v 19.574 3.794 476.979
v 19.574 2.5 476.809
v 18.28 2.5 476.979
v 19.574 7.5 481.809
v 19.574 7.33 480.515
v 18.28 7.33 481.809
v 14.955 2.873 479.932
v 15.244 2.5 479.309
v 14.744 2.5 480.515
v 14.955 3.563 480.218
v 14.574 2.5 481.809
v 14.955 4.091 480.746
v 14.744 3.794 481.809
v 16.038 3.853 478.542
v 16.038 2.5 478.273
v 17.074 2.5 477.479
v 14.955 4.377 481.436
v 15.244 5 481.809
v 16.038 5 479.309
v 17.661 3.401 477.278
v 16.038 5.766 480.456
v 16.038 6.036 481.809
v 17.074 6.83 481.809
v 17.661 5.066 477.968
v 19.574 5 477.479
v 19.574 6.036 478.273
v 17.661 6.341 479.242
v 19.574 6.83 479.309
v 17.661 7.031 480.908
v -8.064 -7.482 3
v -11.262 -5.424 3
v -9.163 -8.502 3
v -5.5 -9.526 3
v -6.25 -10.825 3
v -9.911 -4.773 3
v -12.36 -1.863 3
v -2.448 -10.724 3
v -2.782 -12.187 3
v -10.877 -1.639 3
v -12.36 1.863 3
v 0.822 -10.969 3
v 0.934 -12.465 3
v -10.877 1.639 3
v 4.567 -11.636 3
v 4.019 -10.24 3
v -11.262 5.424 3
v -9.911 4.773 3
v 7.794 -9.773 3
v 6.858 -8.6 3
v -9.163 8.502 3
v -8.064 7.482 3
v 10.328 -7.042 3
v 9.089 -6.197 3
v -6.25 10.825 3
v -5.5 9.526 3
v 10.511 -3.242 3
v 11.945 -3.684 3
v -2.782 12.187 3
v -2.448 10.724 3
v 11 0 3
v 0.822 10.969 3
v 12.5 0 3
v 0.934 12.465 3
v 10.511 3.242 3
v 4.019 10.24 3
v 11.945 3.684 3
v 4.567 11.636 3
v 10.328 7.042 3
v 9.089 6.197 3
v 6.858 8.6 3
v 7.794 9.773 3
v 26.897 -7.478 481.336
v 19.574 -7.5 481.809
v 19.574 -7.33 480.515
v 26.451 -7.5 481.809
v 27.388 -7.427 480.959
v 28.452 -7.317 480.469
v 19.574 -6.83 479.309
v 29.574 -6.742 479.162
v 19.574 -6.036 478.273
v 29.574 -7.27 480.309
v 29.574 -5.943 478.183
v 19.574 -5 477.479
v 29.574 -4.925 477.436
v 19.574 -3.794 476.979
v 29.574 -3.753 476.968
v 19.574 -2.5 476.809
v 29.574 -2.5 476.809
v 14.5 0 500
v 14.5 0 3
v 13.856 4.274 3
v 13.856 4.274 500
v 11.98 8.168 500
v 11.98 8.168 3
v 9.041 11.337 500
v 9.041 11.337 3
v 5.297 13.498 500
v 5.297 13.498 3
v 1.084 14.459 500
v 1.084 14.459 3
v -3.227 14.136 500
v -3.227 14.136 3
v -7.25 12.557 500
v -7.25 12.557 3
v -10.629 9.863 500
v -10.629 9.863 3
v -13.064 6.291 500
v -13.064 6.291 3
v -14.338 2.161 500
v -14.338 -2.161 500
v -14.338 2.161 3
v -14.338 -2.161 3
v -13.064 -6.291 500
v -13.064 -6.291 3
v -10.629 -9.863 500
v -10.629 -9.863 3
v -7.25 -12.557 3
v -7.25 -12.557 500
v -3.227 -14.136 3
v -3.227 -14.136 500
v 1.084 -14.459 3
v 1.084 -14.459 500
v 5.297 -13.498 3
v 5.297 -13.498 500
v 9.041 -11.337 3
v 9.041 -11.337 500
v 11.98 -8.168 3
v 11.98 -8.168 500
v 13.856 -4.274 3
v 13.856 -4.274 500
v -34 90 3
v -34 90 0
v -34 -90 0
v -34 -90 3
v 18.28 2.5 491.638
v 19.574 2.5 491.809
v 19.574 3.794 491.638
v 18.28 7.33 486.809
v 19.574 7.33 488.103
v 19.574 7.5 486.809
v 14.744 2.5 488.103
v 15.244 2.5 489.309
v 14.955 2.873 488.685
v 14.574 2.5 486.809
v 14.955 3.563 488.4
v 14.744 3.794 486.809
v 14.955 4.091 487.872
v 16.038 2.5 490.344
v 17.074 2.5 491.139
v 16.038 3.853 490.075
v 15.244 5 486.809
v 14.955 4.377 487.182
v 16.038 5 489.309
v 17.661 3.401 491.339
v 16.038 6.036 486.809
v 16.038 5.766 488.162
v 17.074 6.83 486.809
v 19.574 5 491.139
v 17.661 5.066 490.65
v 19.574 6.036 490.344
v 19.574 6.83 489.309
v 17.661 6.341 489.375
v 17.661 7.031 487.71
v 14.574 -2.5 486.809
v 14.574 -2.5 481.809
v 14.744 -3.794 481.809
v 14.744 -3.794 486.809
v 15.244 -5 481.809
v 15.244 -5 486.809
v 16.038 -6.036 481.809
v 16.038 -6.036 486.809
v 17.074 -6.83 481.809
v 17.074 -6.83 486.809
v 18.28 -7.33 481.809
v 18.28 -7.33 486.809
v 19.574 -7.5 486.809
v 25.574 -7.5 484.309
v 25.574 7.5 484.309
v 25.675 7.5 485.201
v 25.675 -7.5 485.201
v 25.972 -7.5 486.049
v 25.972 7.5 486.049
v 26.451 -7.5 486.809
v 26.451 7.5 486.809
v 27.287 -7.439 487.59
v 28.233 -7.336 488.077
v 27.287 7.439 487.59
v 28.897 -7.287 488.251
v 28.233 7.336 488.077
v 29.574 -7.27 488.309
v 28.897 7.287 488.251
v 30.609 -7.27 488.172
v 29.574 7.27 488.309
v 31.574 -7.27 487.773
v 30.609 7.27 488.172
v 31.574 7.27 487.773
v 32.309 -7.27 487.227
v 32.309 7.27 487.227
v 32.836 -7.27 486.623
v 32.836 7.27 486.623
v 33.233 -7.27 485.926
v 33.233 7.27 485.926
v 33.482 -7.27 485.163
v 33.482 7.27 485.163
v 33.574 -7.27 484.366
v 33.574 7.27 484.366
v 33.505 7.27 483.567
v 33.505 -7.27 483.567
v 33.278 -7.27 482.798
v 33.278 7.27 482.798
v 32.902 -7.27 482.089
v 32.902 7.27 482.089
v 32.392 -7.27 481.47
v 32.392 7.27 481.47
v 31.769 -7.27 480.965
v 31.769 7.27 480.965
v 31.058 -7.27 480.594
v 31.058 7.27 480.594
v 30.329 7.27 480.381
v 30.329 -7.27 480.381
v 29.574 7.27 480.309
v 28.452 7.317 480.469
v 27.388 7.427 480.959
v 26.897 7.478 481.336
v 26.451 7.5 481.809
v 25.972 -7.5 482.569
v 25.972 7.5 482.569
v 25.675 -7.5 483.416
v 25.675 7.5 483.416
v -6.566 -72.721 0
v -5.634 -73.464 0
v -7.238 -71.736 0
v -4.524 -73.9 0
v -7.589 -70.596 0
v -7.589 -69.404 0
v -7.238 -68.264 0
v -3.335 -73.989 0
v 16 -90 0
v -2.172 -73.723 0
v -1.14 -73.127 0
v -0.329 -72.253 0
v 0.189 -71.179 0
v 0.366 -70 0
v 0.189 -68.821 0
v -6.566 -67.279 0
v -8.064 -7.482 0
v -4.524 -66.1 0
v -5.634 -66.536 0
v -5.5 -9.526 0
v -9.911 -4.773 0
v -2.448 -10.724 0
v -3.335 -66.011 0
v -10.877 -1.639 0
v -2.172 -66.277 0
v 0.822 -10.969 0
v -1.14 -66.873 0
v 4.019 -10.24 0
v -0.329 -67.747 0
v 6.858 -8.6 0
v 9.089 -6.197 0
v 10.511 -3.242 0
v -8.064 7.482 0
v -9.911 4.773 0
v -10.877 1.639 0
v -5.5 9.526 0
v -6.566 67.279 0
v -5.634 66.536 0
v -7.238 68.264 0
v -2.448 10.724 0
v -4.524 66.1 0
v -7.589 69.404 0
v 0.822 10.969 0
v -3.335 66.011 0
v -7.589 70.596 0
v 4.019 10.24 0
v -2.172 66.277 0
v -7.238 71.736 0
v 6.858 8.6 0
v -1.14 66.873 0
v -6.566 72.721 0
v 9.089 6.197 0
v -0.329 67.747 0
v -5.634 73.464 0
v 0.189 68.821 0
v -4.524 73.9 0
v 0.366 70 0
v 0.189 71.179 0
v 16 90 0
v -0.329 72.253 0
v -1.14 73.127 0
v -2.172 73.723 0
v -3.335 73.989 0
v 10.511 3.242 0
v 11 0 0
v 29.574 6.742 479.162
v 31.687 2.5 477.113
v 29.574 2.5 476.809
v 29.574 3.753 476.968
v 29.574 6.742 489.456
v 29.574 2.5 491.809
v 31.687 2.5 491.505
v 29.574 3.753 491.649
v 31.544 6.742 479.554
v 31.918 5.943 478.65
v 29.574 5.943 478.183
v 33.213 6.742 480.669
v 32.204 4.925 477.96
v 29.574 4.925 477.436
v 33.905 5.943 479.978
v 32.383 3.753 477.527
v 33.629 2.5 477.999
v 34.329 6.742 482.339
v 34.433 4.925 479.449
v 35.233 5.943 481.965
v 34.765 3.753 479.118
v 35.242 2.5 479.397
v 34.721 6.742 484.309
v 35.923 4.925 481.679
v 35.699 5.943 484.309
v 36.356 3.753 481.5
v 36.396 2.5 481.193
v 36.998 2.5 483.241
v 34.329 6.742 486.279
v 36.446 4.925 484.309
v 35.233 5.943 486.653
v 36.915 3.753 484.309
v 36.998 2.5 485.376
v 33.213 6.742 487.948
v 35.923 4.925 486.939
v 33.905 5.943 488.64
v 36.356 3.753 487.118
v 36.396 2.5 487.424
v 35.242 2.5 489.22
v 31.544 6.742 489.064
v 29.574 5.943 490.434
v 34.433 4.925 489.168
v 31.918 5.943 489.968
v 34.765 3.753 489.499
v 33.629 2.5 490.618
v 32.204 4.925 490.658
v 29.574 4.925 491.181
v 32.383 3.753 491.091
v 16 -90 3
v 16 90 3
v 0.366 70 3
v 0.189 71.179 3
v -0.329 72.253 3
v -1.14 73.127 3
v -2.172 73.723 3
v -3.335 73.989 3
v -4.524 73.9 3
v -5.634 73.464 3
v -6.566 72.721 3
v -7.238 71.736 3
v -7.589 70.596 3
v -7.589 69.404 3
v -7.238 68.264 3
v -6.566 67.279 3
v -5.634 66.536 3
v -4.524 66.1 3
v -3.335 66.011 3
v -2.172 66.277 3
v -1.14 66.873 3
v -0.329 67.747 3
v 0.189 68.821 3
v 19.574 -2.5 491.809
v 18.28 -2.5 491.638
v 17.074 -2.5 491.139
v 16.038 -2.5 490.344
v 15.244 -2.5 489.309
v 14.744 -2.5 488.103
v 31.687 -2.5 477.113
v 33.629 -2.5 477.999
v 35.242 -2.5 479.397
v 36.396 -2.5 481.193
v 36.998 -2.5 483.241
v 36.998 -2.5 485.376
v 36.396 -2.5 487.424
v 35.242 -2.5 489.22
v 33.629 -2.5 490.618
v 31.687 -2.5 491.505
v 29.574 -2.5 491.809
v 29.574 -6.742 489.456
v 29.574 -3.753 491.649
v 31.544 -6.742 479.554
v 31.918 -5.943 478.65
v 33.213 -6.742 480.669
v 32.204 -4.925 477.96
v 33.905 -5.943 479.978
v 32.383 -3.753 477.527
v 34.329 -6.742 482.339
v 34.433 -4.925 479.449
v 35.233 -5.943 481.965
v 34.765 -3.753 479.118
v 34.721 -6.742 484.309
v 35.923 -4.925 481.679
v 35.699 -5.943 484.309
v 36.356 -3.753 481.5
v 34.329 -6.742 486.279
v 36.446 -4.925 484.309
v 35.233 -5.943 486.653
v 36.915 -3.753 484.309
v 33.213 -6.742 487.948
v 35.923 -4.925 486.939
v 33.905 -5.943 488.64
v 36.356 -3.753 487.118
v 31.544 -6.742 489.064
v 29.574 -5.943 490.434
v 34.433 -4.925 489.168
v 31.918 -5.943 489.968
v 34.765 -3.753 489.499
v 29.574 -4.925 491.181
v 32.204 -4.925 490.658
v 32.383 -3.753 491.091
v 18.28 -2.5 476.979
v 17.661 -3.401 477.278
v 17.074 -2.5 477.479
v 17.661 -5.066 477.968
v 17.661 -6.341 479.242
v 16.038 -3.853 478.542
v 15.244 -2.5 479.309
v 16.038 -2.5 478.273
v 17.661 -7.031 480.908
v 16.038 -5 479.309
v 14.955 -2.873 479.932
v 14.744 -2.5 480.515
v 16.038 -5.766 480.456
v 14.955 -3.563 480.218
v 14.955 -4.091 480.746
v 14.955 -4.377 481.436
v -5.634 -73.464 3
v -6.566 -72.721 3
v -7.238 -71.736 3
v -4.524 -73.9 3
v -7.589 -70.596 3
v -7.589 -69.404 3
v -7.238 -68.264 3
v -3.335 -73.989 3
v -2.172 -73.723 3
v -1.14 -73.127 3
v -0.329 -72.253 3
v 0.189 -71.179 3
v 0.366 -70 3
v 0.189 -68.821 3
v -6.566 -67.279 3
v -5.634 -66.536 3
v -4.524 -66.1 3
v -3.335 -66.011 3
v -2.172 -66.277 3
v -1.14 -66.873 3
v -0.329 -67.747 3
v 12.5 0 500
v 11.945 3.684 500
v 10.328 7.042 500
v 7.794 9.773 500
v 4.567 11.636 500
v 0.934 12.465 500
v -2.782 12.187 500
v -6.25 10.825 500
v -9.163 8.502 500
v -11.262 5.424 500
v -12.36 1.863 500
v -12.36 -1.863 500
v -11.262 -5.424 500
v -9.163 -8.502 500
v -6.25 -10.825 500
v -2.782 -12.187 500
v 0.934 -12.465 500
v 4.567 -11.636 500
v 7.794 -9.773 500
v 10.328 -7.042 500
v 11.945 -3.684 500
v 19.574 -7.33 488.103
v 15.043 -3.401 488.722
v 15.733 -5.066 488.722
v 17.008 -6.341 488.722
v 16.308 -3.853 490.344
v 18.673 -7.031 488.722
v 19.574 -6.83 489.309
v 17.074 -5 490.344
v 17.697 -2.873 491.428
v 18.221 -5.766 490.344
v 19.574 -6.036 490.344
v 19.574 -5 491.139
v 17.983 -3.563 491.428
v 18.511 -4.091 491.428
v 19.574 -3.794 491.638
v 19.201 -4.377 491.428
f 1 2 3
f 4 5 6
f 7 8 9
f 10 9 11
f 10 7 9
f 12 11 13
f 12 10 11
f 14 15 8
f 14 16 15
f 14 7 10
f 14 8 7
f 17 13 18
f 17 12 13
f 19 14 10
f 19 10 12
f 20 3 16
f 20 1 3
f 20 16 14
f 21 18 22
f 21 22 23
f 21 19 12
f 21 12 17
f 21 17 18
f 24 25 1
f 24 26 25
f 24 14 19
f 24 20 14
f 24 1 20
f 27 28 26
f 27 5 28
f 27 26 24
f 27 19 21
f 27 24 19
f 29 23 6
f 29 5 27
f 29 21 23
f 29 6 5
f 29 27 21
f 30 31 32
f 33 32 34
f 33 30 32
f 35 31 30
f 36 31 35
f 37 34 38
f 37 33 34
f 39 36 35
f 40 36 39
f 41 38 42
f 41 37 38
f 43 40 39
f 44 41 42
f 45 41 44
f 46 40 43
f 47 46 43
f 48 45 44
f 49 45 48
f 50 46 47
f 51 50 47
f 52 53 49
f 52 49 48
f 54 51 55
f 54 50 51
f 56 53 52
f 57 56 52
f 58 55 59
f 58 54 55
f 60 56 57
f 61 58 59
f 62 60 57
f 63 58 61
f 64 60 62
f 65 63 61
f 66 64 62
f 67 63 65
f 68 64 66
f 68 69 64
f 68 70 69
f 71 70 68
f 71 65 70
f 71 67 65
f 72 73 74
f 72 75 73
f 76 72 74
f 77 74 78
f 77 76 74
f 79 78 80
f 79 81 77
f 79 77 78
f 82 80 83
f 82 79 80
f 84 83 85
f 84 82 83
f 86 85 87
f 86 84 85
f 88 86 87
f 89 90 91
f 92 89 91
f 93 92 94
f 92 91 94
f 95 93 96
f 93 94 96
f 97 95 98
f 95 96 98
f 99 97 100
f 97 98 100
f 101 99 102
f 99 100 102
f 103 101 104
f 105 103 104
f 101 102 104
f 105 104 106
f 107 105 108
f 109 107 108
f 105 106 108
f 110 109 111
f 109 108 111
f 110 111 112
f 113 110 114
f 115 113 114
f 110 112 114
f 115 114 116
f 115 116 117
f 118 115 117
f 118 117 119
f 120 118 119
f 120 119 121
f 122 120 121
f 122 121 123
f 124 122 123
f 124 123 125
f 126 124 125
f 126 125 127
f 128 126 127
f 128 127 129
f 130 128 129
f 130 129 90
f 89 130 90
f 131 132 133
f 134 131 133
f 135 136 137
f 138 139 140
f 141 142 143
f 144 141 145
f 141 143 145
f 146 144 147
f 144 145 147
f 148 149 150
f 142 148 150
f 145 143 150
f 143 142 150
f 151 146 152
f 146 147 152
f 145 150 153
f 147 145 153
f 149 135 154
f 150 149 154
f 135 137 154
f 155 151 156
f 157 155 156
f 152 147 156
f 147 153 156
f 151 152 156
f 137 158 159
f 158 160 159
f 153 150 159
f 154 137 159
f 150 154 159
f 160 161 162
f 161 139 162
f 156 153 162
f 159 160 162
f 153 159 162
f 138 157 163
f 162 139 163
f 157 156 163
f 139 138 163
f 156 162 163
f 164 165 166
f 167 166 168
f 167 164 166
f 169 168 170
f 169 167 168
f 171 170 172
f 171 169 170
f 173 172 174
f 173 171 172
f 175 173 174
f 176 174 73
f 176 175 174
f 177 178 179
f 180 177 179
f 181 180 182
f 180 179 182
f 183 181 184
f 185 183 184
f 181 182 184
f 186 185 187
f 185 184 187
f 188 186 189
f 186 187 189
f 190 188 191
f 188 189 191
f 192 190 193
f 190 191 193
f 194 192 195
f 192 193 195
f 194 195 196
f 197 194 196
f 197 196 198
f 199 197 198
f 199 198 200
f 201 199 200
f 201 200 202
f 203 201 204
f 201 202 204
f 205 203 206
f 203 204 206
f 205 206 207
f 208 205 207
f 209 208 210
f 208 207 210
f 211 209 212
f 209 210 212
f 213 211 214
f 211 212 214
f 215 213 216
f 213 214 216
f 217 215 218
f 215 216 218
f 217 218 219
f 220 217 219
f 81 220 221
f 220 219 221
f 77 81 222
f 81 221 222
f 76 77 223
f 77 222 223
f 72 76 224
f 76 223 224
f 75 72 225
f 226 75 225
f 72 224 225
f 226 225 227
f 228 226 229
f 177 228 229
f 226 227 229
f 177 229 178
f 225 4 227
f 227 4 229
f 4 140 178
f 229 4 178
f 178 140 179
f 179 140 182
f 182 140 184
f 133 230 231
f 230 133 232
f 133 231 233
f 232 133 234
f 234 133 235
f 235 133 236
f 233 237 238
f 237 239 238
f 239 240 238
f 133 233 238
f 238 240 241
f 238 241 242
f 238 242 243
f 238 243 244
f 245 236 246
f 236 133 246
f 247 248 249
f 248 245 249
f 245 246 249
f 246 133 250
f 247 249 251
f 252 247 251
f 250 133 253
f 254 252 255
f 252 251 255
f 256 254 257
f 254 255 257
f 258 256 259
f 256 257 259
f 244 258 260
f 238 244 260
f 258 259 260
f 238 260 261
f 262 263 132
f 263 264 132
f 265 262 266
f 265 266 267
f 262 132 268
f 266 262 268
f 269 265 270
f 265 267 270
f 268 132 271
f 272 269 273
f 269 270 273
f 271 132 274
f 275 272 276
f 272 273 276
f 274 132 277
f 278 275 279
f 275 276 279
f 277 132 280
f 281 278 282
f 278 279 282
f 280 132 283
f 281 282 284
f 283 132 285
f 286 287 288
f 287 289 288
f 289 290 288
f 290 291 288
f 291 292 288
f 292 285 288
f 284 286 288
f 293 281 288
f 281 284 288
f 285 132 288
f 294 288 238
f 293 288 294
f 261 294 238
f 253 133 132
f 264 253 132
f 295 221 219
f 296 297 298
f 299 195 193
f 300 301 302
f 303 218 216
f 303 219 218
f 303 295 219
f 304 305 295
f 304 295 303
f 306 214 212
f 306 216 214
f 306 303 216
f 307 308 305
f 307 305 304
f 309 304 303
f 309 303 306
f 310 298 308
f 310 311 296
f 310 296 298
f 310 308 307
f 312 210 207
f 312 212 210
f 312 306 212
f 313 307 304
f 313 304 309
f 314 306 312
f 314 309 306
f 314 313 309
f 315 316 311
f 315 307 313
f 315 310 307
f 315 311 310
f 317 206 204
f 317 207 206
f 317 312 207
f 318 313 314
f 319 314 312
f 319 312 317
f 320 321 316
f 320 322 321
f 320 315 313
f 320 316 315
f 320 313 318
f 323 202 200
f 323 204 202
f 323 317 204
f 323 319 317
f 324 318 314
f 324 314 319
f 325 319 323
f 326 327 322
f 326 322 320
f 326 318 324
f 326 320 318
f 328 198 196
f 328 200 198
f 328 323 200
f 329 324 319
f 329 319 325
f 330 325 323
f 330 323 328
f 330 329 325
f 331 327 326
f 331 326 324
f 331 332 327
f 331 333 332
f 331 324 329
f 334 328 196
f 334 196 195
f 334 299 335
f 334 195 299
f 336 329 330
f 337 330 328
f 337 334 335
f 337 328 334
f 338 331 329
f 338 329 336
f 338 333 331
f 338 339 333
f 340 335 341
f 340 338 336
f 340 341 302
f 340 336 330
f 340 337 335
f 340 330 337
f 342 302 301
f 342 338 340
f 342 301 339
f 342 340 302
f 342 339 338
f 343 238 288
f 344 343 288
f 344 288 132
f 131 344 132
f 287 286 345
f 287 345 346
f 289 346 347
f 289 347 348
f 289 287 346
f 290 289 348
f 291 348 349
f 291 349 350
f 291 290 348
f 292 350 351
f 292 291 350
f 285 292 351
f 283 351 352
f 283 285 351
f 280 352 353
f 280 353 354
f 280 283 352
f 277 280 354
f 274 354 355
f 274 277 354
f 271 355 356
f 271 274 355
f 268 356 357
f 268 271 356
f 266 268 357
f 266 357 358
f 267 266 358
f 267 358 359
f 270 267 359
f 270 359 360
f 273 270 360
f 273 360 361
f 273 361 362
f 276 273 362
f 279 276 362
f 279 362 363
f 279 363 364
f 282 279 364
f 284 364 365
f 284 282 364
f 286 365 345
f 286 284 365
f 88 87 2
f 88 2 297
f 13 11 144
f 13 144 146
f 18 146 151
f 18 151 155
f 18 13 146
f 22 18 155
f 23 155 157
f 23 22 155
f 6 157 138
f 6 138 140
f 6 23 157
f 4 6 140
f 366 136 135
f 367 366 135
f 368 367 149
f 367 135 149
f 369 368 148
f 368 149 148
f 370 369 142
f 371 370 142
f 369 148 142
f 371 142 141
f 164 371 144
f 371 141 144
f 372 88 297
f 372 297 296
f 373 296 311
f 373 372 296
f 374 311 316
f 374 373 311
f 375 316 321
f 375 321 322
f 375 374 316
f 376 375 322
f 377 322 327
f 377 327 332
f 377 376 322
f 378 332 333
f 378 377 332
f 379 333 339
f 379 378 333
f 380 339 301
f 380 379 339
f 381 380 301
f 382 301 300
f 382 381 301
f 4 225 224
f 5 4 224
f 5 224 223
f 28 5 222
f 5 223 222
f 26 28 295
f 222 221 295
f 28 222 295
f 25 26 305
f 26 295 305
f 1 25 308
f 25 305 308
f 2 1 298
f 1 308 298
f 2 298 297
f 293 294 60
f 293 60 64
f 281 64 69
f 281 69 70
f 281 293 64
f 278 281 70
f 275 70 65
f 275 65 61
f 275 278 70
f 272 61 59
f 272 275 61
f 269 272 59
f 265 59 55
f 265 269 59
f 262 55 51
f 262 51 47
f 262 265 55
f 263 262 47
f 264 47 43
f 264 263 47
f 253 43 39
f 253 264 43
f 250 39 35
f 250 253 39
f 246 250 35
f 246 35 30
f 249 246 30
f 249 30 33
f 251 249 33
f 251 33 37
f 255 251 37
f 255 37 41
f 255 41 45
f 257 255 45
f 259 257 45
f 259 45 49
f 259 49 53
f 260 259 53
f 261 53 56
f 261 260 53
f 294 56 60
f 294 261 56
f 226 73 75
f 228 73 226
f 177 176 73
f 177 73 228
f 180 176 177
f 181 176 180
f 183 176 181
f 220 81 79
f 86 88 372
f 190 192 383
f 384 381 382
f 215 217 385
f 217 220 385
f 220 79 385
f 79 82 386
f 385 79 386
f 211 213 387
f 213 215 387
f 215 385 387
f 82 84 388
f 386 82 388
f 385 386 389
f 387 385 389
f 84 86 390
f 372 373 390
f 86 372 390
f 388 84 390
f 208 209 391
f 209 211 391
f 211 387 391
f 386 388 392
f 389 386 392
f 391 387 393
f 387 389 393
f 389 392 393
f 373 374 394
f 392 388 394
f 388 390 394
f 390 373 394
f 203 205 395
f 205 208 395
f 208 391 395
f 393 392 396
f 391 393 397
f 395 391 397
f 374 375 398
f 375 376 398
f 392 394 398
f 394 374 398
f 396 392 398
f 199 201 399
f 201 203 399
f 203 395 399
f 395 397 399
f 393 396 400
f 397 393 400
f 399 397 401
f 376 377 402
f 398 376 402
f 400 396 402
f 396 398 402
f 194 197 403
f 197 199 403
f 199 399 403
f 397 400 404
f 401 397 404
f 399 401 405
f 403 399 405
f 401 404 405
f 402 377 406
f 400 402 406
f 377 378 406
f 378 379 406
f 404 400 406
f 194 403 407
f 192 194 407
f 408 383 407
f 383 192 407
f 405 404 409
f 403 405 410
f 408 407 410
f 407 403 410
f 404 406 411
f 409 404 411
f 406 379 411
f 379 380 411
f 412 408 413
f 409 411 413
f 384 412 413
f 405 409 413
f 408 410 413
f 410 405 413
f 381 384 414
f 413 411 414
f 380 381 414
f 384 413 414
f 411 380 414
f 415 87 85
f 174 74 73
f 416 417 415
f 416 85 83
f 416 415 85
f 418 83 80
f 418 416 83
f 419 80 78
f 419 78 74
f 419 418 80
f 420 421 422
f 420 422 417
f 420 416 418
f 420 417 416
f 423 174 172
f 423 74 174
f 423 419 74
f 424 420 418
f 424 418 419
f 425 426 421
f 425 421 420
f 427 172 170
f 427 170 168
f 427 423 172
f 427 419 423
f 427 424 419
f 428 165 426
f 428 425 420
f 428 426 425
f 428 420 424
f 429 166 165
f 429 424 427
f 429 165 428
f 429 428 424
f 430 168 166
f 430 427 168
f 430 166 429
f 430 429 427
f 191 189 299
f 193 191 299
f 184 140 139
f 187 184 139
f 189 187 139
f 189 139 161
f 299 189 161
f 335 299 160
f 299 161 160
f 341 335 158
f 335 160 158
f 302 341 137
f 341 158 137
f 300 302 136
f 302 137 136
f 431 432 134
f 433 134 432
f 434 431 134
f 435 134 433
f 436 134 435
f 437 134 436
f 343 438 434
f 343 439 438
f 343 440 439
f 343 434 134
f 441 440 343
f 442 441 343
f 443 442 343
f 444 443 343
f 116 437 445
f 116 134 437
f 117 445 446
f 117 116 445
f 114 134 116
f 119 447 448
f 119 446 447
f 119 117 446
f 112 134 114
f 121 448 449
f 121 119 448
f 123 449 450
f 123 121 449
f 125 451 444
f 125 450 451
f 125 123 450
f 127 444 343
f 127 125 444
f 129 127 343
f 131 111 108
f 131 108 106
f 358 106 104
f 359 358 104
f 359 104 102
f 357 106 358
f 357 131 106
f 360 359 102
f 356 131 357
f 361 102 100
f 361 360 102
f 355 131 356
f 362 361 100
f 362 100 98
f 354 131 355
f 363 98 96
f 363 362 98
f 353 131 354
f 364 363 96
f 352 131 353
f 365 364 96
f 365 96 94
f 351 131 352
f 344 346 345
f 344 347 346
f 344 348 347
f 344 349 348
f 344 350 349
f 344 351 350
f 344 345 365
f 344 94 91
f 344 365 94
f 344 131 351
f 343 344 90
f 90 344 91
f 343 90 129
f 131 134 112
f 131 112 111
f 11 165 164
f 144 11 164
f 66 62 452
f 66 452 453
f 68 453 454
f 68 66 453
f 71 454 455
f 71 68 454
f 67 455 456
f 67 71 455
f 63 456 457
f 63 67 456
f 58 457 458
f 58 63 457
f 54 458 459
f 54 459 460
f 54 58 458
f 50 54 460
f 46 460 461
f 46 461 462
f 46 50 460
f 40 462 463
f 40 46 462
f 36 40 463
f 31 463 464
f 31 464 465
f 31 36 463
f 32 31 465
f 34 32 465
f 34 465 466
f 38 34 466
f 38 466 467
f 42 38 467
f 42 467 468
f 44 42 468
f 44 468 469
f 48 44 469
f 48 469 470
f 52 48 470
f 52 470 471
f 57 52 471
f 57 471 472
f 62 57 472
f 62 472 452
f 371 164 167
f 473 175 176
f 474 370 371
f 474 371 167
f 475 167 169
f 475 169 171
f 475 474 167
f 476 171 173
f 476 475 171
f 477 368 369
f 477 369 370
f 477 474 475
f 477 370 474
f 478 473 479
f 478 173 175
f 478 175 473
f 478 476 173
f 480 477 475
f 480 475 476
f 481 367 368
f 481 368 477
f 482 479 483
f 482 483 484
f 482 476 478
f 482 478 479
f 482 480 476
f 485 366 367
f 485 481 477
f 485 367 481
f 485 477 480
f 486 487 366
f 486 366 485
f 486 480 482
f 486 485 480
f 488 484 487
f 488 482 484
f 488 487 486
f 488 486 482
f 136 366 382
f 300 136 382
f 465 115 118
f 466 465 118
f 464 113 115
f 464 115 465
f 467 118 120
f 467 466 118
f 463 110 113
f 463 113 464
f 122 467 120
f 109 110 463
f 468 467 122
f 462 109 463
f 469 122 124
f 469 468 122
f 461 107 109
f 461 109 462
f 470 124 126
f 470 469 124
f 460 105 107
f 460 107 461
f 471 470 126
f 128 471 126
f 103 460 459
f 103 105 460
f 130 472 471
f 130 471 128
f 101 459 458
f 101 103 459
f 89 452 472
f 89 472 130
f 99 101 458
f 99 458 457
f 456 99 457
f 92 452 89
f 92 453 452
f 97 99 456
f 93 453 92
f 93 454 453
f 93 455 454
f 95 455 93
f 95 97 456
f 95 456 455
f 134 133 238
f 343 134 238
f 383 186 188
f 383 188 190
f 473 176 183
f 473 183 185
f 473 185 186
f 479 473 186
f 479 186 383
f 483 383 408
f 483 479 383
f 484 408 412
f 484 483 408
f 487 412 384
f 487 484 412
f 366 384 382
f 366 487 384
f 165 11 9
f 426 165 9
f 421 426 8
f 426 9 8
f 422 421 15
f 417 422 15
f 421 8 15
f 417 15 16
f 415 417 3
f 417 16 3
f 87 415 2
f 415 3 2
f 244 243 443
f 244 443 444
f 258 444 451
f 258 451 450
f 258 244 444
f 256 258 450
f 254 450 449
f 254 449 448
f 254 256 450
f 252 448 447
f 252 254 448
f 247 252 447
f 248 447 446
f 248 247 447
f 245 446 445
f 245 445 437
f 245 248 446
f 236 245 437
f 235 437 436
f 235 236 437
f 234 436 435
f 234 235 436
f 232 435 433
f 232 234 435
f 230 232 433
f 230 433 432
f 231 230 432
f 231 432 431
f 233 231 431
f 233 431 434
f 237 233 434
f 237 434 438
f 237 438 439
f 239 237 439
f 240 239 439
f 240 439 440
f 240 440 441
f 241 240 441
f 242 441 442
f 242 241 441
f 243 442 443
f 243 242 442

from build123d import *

# Parameters (mm, degrees)
F0_R         = 14.5
F0_R_2       = 12.5
F1_DEPTH     = 500
F2_R         = 4
F2_R_2       = 11
F3_DEPTH     = 3
F4_W         = 15
F4_H         = 15
F5_DEPTH     = 7.5
F6_R         = 5
F7_T1_DEPTH  = 5
F7_T3_DEPTH  = 5
F7_S7_W      = 5
F7_S7_H      = 5
F7_T8_DEPTH  = 5
F7_S13_W     = 5
F7_S13_H     = 5
F7_T14_DEPTH = 5
F7_T18_ANGLE = 90
F7_T20_ANGLE = 90
F9_D         = 8


# Not quite as in the source:
# - a fillet or chamfer that OpenCascade refuses, or shapes differently, is made with other operations: its cross-section is extruded or revolved along the edge and cut away or added


with BuildPart() as f1:
    # F0 (on Top) → F1 (new body)
    with BuildSketch(Plane.XY):
        Circle(F0_R)
        Circle(F0_R_2, mode=Mode.SUBTRACT)
    extrude(amount=F1_DEPTH)

    # F2 (on Top) → F3 (join)
    with BuildSketch(Plane.XY):
        Polygon((16, -90), (16, 0), (16, 90), (-34, 90), (-34, -90), align=None)
        with Locations((-3.6336369812, -70)):
            Circle(F2_R, mode=Mode.SUBTRACT)
        Circle(F2_R_2, mode=Mode.SUBTRACT)
        with Locations((-3.6336369812, 70)):
            Circle(F2_R, mode=Mode.SUBTRACT)
    extrude(amount=F3_DEPTH)


with BuildPart() as f5:
    # F4 (on Front) → F5 (new body, symmetric)
    with BuildSketch(Plane.XZ):
        with Locations((22.0739521831, 484.3088161945)):
            Rectangle(F4_W, F4_H)
        with BuildLine():
            ThreePointArc((29.5739521831, 476.8088161945), (37.0739521831, 484.3088161945), (29.5739521831, 491.8088161945))
            Line((29.5739521831, 491.8088161945), (29.5739521831, 476.8088161945))
        make_face()
    extrude(amount=F5_DEPTH, both=True)

    # F6
    f6_edges = [f5.edges().sort_by_distance(p)[0] for p in [
        (14.573952, -7.5, 484.308816),
        (37.073952, -7.5, 484.308816),
        (22.073952, 7.5, 476.808816),
    ]]
    fillet(f6_edges, radius=F6_R)

    # F7: fillet of radius 5 on 1 edges, made by hand

    # F7_s2 → F7_t1 (cut)
    with BuildSketch(Plane.XY.offset(481.8088161945)):
        with BuildLine():
            ThreePointArc((14.5739521831, 2.5), (16.0384182772, 6.0355339059), (19.5739521831, 7.5))
            Line((19.5739521831, 7.5), (14.5739521831, 7.5))
            Line((14.5739521831, 7.5), (14.5739521831, 2.5))
        make_face()
    extrude(amount=F7_T1_DEPTH, mode=Mode.SUBTRACT)

    # F7_s4 → F7_t3 (cut)
    with BuildSketch(Plane.XZ.offset(-2.5)):
        with BuildLine():
            ThreePointArc((14.5739521831, 481.8088161945), (16.0384182772, 478.2732822886), (19.5739521831, 476.8088161945))
            Line((19.5739521831, 476.8088161945), (14.5739521831, 476.8088161945))
            Line((14.5739521831, 476.8088161945), (14.5739521831, 481.8088161945))
        make_face()
        with BuildLine():
            ThreePointArc((19.5739521831, 491.8088161945), (16.0384182772, 490.3443501005), (14.5739521831, 486.8088161945))
            Line((14.5739521831, 486.8088161945), (14.5739521831, 491.8088161945))
            Line((14.5739521831, 491.8088161945), (19.5739521831, 491.8088161945))
        make_face()
    extrude(amount=F7_T3_DEPTH, mode=Mode.SUBTRACT)


with BuildPart() as f7_tool6:
    # F7_s7 → F7_t8 (new body)
    with BuildSketch(Plane.YZ.offset(19.5739521831)):
        with Locations((-5, 479.3088161945)):
            Rectangle(F7_S7_W, F7_S7_H)
    extrude(amount=-F7_T8_DEPTH)

    # F7_s9 → F7_t10 (revolve, cut)
    with BuildSketch(Plane(origin=(19.5739521831, -2.5, 481.8088161945), x_dir=(0, 0.7071067812, 0.7071067812), z_dir=(0, -0.7071067812, 0.7071067812))):
        with BuildLine():
            ThreePointArc((0, -5), (5, 0), (0, 5))
            Line((0, 5), (0, -5))
        make_face()
    revolve(axis=Axis((19.5739521831, -2.5, 481.8088161945), (-1, 0, 0)), mode=Mode.SUBTRACT)


with BuildPart() as f5_1:
    add(f5.part)

    # F7_t5: cut F7_tool6
    add(f7_tool6.part, mode=Mode.SUBTRACT)


with BuildPart() as f7_tool12:
    # F7_s13 → F7_t14 (new body)
    with BuildSketch(Plane.XY.offset(486.8088161945)):
        with Locations((17.0739521831, -5)):
            Rectangle(F7_S13_W, F7_S13_H)
    extrude(amount=F7_T14_DEPTH)

    # F7_s15 → F7_t16 (revolve, cut)
    with BuildSketch(Plane(origin=(19.5739521831, -2.5, 486.8088161945), x_dir=(0.7071067812, 0.7071067812, 0), z_dir=(0.7071067812, -0.7071067812, 0))):
        with BuildLine():
            ThreePointArc((0, -5), (5, 0), (0, 5))
            Line((0, 5), (0, -5))
        make_face()
    revolve(axis=Axis((19.5739521831, -2.5, 486.8088161945), (0, 0, 1)), mode=Mode.SUBTRACT)


with BuildPart() as f5_2:
    add(f5_1.part)

    # F7_t11: cut F7_tool12
    add(f7_tool12.part, mode=Mode.SUBTRACT)

    # F7_s17 → F7_t18 (revolve, cut)
    with BuildSketch(Plane.XZ.offset(-2.5)):
        with BuildLine():
            ThreePointArc((14.5739521831, 486.8088161945), (16.0384182772, 490.3443501005), (19.5739521831, 491.8088161945))
            Line((19.5739521831, 491.8088161945), (14.5739521831, 491.8088161945))
            Line((14.5739521831, 491.8088161945), (14.5739521831, 486.8088161945))
        make_face()
    revolve(axis=Axis((14.5739521831, 2.5, 486.8088161945), (-1, 0, 0)), revolution_arc=F7_T18_ANGLE, mode=Mode.SUBTRACT)

    # F7_s19 → F7_t20 (revolve, cut)
    with BuildSketch(Plane.XZ.offset(-2.5)):
        with BuildLine():
            ThreePointArc((14.5739521831, 481.8088161945), (16.0384182772, 478.2732822886), (19.5739521831, 476.8088161945))
            Line((19.5739521831, 476.8088161945), (14.5739521831, 476.8088161945))
            Line((14.5739521831, 476.8088161945), (14.5739521831, 481.8088161945))
        make_face()
    revolve(axis=Axis((14.5739521831, 2.5, 481.8088161945), (1, 0, 0)), revolution_arc=F7_T20_ANGLE, mode=Mode.SUBTRACT)

    # F9 (through all)
    with Locations(Plane.XZ.offset(7.5)):
        with Locations((29.5739521831, 484.3088161945)):
            Hole(F9_D / 2)


solid = Compound([f1.part, f5_2.part])
